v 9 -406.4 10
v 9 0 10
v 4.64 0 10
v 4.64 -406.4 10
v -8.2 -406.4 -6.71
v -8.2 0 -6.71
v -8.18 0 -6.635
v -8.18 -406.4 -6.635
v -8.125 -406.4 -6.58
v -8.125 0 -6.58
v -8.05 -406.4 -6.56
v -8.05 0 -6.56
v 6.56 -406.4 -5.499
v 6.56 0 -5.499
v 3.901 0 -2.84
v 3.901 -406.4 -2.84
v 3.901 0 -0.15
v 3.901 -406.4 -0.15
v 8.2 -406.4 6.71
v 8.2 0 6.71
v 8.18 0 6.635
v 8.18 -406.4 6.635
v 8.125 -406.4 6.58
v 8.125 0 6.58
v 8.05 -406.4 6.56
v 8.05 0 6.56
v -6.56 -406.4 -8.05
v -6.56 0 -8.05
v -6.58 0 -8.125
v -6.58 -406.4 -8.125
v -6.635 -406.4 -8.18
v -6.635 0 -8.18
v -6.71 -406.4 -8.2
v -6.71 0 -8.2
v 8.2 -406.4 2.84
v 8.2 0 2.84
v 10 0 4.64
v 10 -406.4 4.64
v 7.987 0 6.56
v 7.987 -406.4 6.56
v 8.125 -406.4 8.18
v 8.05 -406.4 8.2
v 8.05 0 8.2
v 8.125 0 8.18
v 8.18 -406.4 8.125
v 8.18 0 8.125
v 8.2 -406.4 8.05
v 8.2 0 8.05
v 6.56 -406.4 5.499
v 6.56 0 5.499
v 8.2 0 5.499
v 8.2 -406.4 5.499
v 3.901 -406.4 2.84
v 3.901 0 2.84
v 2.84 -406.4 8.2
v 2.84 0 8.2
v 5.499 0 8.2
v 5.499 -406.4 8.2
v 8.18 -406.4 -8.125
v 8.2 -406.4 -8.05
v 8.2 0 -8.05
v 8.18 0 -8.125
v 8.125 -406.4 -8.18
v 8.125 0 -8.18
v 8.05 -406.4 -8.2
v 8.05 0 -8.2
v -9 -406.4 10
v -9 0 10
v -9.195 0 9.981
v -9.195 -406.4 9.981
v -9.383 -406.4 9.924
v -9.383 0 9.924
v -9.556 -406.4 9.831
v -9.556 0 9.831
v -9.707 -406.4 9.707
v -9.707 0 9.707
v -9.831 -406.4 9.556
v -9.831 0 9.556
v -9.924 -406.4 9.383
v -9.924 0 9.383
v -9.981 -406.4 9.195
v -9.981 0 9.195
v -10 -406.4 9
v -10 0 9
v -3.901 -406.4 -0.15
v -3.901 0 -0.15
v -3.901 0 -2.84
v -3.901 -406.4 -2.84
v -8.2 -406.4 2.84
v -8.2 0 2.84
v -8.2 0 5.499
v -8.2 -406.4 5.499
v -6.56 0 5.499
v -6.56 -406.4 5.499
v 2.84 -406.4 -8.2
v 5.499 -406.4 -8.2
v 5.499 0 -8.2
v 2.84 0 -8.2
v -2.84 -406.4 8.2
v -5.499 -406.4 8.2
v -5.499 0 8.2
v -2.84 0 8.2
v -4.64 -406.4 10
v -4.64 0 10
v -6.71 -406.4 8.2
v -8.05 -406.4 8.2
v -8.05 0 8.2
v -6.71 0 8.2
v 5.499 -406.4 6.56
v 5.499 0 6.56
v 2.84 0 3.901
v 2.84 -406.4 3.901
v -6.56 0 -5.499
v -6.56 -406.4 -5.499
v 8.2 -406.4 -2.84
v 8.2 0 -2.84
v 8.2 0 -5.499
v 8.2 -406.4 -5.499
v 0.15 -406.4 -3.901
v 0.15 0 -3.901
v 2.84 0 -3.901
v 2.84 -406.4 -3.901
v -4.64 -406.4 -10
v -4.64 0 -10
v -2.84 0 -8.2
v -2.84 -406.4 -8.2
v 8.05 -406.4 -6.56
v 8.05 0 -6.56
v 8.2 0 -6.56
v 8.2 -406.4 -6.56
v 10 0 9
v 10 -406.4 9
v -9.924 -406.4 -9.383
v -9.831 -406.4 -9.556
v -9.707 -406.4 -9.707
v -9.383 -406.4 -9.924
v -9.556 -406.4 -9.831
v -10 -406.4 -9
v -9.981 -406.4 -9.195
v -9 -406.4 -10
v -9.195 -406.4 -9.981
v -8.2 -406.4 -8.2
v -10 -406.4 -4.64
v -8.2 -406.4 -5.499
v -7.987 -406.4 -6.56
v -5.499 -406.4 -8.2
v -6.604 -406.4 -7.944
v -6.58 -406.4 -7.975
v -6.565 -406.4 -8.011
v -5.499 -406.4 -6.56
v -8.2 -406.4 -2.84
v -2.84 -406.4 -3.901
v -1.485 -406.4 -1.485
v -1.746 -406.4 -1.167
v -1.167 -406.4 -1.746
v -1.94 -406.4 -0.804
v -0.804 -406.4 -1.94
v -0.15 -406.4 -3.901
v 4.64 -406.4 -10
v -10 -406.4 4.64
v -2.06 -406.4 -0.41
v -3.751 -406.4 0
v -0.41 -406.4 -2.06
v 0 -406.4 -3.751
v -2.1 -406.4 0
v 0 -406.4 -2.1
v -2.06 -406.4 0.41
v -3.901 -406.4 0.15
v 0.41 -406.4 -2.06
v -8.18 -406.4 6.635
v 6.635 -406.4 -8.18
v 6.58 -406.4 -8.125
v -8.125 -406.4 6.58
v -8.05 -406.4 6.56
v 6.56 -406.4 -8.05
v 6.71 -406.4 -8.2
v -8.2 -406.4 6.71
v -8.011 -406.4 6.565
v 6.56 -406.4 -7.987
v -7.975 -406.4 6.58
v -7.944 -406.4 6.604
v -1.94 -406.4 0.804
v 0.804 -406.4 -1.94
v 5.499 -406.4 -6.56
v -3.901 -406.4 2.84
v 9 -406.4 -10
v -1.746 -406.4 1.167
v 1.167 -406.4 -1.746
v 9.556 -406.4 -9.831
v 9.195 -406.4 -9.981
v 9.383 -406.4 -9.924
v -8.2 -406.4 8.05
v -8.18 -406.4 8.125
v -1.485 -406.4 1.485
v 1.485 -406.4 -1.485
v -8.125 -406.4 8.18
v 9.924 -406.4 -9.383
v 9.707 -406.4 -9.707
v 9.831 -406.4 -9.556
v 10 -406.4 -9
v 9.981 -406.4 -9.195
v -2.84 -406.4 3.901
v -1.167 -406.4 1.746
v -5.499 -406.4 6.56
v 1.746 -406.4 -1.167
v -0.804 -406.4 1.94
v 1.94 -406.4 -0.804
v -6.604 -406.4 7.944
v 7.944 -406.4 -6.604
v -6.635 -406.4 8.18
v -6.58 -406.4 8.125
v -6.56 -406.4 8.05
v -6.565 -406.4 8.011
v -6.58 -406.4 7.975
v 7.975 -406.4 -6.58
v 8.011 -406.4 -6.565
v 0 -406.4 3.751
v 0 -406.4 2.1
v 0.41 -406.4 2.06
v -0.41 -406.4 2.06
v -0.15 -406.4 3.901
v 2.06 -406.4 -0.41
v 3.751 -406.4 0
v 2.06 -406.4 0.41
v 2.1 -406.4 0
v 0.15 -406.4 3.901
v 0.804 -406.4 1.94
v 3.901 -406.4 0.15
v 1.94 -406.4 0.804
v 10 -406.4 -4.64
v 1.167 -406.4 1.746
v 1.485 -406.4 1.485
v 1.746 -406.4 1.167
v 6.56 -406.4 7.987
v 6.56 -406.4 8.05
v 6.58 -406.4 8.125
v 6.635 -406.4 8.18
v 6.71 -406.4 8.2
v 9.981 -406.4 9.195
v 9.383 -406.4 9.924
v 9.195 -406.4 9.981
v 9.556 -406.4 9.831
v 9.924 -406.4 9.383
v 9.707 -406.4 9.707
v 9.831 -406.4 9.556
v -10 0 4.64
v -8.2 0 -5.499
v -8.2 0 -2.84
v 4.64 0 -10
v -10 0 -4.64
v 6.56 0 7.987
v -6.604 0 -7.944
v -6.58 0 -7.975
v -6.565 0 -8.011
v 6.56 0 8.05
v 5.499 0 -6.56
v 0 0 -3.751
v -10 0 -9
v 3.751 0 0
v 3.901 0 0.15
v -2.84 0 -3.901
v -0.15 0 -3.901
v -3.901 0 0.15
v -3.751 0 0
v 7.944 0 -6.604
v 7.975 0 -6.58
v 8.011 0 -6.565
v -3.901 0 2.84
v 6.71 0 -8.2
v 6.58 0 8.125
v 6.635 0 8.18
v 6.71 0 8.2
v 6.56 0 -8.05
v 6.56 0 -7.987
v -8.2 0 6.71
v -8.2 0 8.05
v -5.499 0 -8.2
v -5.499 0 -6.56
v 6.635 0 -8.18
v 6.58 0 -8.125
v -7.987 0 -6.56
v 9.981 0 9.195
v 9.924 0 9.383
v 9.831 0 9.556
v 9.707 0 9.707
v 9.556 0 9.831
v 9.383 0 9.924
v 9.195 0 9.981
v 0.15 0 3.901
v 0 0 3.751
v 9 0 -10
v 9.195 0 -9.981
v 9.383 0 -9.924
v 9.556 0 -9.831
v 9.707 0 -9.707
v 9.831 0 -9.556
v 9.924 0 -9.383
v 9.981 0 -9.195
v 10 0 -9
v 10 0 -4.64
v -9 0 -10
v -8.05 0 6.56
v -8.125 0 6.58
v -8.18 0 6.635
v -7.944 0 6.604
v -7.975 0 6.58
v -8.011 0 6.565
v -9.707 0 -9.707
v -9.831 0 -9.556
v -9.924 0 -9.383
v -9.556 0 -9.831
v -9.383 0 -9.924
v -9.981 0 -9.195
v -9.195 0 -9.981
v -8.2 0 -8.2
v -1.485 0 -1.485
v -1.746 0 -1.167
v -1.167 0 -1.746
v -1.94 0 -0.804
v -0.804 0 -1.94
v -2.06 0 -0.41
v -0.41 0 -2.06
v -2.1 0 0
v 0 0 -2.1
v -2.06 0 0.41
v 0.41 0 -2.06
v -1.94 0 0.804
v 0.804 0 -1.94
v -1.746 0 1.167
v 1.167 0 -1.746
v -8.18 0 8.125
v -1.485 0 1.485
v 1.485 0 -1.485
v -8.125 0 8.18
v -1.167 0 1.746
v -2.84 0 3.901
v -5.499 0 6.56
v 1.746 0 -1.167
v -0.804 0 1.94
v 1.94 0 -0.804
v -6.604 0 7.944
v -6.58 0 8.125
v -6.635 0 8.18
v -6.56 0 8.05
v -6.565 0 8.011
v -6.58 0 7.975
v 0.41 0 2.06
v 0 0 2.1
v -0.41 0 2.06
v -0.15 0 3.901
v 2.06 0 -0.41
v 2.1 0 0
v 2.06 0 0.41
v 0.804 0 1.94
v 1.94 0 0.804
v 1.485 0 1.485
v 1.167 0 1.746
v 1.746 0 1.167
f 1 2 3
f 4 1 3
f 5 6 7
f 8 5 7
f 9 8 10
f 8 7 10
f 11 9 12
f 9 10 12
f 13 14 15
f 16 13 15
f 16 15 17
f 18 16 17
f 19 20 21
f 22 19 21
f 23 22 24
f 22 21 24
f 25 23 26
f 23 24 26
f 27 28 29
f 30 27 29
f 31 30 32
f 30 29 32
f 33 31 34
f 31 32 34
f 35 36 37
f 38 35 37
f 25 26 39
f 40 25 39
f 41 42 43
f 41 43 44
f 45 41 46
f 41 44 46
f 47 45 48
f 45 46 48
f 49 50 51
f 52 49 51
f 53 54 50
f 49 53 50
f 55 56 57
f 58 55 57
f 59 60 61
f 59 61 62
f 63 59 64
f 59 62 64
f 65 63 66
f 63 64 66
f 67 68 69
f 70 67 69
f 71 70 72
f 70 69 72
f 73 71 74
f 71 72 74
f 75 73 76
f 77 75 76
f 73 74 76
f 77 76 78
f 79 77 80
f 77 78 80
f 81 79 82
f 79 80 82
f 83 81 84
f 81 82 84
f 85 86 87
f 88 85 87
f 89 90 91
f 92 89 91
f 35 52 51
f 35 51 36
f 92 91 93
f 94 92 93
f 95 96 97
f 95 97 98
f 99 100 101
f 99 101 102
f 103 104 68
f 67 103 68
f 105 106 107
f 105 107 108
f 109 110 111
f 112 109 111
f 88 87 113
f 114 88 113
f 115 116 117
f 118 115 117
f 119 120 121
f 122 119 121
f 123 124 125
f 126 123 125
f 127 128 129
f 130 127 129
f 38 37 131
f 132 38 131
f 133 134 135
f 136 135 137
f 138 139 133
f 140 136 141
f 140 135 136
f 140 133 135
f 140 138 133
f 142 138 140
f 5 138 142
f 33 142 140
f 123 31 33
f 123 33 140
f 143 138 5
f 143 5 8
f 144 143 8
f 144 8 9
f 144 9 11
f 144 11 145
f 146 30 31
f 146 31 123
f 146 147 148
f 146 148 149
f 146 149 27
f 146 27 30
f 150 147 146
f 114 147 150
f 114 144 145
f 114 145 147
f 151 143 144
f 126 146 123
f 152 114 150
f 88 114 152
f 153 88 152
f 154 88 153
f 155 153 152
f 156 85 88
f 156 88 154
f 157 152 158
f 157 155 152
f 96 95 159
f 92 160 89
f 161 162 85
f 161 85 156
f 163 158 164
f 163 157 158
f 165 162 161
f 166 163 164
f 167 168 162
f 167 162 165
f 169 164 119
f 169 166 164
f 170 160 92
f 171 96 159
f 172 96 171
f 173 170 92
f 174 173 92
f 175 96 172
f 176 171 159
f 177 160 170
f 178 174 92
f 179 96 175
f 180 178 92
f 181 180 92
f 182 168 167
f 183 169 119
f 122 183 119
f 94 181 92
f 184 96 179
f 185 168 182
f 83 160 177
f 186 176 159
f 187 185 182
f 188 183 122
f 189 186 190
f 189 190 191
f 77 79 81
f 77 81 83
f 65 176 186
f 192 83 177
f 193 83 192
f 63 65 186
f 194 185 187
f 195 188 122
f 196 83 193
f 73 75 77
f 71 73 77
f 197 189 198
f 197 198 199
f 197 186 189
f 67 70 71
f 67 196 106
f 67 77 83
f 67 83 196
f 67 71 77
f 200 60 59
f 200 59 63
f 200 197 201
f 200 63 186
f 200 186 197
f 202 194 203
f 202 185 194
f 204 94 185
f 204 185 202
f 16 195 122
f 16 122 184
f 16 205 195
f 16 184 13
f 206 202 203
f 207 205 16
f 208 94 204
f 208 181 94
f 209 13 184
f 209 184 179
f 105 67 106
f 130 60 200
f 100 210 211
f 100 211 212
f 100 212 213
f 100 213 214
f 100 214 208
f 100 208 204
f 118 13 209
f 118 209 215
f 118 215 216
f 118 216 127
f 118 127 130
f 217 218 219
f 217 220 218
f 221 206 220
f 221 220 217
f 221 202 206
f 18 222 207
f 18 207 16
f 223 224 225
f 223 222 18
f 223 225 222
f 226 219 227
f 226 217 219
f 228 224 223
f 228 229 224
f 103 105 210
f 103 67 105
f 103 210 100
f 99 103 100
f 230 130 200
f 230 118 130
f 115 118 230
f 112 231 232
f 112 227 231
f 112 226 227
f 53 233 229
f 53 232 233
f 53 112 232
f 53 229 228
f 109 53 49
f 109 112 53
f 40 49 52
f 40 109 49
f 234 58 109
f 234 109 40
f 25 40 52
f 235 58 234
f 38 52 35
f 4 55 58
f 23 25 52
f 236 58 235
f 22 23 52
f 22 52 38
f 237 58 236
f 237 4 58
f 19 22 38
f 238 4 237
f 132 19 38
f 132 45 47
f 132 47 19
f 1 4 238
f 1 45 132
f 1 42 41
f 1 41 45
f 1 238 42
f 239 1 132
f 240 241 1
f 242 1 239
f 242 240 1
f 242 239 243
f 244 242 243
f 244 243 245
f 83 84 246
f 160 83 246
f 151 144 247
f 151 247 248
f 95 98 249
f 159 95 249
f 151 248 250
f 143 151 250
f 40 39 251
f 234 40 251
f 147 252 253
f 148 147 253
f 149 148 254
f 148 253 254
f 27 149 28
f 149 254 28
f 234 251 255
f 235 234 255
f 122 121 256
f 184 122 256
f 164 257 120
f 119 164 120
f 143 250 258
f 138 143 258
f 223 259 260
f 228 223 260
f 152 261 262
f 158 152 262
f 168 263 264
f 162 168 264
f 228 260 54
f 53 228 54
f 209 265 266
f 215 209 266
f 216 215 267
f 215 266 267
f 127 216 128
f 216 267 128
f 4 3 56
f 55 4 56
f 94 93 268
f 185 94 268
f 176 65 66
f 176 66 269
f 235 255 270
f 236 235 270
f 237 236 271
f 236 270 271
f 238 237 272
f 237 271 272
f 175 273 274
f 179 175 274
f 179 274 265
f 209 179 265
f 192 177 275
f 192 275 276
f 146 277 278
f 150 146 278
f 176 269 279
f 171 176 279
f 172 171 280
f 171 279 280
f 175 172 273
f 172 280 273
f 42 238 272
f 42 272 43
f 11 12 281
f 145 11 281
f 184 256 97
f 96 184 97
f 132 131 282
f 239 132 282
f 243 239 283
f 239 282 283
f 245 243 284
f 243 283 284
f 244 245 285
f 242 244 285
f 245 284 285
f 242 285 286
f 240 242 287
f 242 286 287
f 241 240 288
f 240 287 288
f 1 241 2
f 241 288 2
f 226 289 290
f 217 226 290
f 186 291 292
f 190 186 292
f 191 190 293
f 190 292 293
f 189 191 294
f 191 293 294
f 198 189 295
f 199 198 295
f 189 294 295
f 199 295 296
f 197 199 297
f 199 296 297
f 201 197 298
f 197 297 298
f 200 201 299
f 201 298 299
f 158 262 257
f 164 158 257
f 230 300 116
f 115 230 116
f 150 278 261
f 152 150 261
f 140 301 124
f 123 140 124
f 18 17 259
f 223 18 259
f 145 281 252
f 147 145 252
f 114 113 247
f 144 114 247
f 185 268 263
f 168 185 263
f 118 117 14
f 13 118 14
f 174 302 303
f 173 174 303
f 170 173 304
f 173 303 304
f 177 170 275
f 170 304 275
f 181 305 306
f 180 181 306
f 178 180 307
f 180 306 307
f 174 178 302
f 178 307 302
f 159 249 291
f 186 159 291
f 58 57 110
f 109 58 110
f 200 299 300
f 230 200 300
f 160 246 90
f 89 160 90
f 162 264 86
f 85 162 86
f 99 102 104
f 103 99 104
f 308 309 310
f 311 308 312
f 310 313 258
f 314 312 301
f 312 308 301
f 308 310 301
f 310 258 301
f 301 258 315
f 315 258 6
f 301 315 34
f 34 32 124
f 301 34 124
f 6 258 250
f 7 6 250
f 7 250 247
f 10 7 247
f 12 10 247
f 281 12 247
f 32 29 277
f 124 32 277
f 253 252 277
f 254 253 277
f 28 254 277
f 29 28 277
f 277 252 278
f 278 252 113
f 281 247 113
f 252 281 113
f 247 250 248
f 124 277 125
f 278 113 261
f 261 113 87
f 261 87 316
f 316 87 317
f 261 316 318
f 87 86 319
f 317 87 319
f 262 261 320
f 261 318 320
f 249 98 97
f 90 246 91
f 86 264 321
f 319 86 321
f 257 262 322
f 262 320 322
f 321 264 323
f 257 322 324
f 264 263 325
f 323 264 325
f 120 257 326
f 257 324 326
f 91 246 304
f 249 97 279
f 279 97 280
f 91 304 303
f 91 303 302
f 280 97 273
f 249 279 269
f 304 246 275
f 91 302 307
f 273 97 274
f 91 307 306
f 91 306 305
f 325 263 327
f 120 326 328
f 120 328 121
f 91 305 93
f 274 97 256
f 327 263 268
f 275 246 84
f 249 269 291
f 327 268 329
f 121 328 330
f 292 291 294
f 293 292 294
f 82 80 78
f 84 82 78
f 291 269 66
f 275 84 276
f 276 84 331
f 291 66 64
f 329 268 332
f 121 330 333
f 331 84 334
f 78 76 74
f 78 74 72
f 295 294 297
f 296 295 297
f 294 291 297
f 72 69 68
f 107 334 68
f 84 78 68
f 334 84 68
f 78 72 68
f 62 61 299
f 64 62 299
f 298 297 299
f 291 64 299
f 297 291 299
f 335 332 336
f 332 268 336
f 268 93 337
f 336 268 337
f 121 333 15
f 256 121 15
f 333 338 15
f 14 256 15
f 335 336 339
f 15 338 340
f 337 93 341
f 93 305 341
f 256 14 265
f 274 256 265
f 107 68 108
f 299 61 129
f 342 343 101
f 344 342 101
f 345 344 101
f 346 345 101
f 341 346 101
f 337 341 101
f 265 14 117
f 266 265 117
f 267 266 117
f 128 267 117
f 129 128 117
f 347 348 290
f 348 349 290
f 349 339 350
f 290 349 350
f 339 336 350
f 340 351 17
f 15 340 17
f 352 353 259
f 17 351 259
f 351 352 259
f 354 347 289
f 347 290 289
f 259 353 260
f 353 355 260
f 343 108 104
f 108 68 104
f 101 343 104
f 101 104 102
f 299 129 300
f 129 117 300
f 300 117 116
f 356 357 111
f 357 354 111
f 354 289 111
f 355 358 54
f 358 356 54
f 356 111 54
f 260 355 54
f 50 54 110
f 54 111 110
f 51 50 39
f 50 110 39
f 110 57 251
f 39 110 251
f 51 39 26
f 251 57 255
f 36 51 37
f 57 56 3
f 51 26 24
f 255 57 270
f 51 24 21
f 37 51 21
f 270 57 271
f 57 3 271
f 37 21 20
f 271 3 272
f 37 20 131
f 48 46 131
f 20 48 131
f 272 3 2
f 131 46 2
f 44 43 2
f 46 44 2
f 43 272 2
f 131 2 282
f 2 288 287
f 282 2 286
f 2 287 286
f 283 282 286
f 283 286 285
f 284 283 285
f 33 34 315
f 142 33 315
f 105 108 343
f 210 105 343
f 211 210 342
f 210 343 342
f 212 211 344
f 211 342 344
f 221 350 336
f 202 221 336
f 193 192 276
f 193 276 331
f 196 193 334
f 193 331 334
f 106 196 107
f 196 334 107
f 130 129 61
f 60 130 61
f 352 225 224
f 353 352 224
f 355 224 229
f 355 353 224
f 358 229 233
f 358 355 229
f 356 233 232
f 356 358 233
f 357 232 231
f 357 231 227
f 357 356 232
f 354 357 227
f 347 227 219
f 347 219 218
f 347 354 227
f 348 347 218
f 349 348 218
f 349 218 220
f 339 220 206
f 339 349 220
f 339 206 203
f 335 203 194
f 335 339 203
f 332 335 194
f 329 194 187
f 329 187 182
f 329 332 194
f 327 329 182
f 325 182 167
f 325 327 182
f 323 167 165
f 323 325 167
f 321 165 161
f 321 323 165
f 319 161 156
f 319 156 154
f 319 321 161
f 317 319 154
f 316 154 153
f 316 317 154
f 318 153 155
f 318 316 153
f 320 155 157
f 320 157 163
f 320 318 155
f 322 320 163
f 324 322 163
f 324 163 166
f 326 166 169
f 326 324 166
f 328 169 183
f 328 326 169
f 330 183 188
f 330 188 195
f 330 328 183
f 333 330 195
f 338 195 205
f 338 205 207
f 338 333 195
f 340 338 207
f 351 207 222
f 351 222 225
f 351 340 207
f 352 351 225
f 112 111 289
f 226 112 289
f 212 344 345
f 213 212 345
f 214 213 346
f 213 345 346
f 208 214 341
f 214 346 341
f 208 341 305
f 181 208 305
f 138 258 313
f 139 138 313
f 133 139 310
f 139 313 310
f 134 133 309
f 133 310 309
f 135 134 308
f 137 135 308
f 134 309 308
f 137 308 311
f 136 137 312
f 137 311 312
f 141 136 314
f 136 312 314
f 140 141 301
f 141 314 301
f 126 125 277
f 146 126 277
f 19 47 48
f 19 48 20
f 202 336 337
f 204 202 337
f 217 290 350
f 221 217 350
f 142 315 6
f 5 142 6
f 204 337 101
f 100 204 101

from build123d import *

# Parameters (mm, degrees)
F0_R     = 2.1
F1_DEPTH = 406.4


with BuildPart() as f1:
    # F0 (on Front) → F1 (new body)
    with BuildSketch(Plane.XZ):
        with BuildLine():
            Line((-4.64, 10), (-9, 10))
            ThreePointArc((-9, 10), (-9.707107, 9.707107), (-10, 9))
            Line((-10, 9), (-10, 4.64))
            Line((-10, 4.64), (-8.2, 2.84))
            Line((-8.2, 2.84), (-8.2, 5.49934))
            Line((-8.2, 5.49934), (-6.56, 5.49934))
            Line((-6.56, 5.49934), (-3.90066, 2.84))
            Line((-3.90066, 2.84), (-3.90066, 0.15))
            Line((-3.90066, 0.15), (-3.75066, 0))
            Line((-3.75066, 0), (-3.90066, -0.15))
            Line((-3.90066, -0.15), (-3.90066, -2.84))
            Line((-3.90066, -2.84), (-6.56, -5.49934))
            Line((-6.56, -5.49934), (-8.2, -5.49934))
            Line((-8.2, -5.49934), (-8.2, -2.84))
            Line((-8.2, -2.84), (-10, -4.64))
            Line((-10, -4.64), (-10, -9))
            ThreePointArc((-10, -9), (-9.707107, -9.707107), (-9, -10))
            Line((-9, -10), (-4.64, -10))
            Line((-4.64, -10), (-2.84, -8.2))
            Line((-2.84, -8.2), (-5.49934, -8.2))
            Line((-5.49934, -8.2), (-5.49934, -6.56))
            Line((-5.49934, -6.56), (-2.84, -3.90066))
            Line((-2.84, -3.90066), (-0.15, -3.90066))
            Line((-0.15, -3.90066), (0, -3.75066))
            Line((0, -3.75066), (0.15, -3.90066))
            Line((0.15, -3.90066), (2.84, -3.90066))
            Line((2.84, -3.90066), (5.49934, -6.56))
            Line((5.49934, -6.56), (5.49934, -8.2))
            Line((5.49934, -8.2), (2.84, -8.2))
            Line((2.84, -8.2), (4.64, -10))
            Line((4.64, -10), (9, -10))
            ThreePointArc((9, -10), (9.707107, -9.707107), (10, -9))
            Line((10, -9), (10, -4.64))
            Line((10, -4.64), (8.2, -2.84))
            Line((8.2, -2.84), (8.2, -5.49934))
            Line((8.2, -5.49934), (6.56, -5.49934))
            Line((6.56, -5.49934), (3.90066, -2.84))
            Line((3.90066, -2.84), (3.90066, -0.15))
            Line((3.90066, -0.15), (3.75066, 0))
            Line((3.75066, 0), (3.90066, 0.15))
            Line((3.90066, 0.15), (3.90066, 2.84))
            Line((3.90066, 2.84), (6.56, 5.49934))
            Line((6.56, 5.49934), (8.2, 5.49934))
            Line((8.2, 5.49934), (8.2, 2.84))
            Line((8.2, 2.84), (10, 4.64))
            Line((10, 4.64), (10, 9))
            ThreePointArc((10, 9), (9.707107, 9.707107), (9, 10))
            Line((9, 10), (4.64, 10))
            Line((4.64, 10), (2.84, 8.2))
            Line((2.84, 8.2), (5.49934, 8.2))
            Line((5.49934, 8.2), (5.49934, 6.56))
            Line((5.49934, 6.56), (2.84, 3.90066))
            Line((2.84, 3.90066), (0.15, 3.90066))
            Line((0.15, 3.90066), (0, 3.75066))
            Line((0, 3.75066), (-0.15, 3.90066))
            Line((-0.15, 3.90066), (-2.84, 3.90066))
            Line((-2.84, 3.90066), (-5.49934, 6.56))
            Line((-5.49934, 6.56), (-5.49934, 8.2))
            Line((-5.49934, 8.2), (-2.84, 8.2))
            Line((-2.84, 8.2), (-4.64, 10))
        make_face()
        with BuildLine():
            Line((-8.2, -8.2), (-8.2, -6.71))
            ThreePointArc((-8.2, -6.71), (-8.156066, -6.603934), (-8.05, -6.56))
            Line((-8.05, -6.56), (-7.98749, -6.56))
            Line((-7.98749, -6.56), (-6.603934, -7.943556))
            ThreePointArc((-6.603934, -7.943556), (-6.571418, -7.992219), (-6.56, -8.049622))
            Line((-6.56, -8.049622), (-6.56, -8.05))
            ThreePointArc((-6.56, -8.05), (-6.603934, -8.156066), (-6.71, -8.2))
            Line((-6.71, -8.2), (-8.2, -8.2))
        make_face(mode=Mode.SUBTRACT)
        with BuildLine():
            ThreePointArc((6.71, -8.2), (6.603934, -8.156066), (6.56, -8.05))
            Line((6.56, -8.05), (6.56, -7.98749))
            Line((6.56, -7.98749), (7.943556, -6.603934))
            ThreePointArc((7.943556, -6.603934), (7.992219, -6.571418), (8.049622, -6.56))
            Line((8.049622, -6.56), (8.2, -6.56))
            Line((8.2, -6.56), (8.2, -8.05))
            ThreePointArc((8.2, -8.05), (8.156066, -8.156066), (8.05, -8.2))
            Line((8.05, -8.2), (6.71, -8.2))
        make_face(mode=Mode.SUBTRACT)
        with BuildLine():
            ThreePointArc((-8.2, 8.05), (-8.156066, 8.156066), (-8.05, 8.2))
            Line((-8.05, 8.2), (-6.71, 8.2))
            ThreePointArc((-6.71, 8.2), (-6.603934, 8.156066), (-6.56, 8.05))
            Line((-6.56, 8.05), (-6.56, 8.049622))
            ThreePointArc((-6.56, 8.049622), (-6.571418, 7.992219), (-6.603934, 7.943556))
            Line((-6.603934, 7.943556), (-7.943556, 6.603934))
            ThreePointArc((-7.943556, 6.603934), (-7.992219, 6.571418), (-8.049622, 6.56))
            Line((-8.049622, 6.56), (-8.05, 6.56))
            ThreePointArc((-8.05, 6.56), (-8.156066, 6.603934), (-8.2, 6.71))
            Line((-8.2, 6.71), (-8.2, 8.05))
        make_face(mode=Mode.SUBTRACT)
        Circle(F0_R, mode=Mode.SUBTRACT)
        with BuildLine():
            Line((8.2, 8.05), (8.2, 6.71))
            ThreePointArc((8.2, 6.71), (8.156066, 6.603934), (8.05, 6.56))
            Line((8.05, 6.56), (7.98749, 6.56))
            Line((7.98749, 6.56), (6.56, 7.98749))
            Line((6.56, 7.98749), (6.56, 8.05))
            ThreePointArc((6.56, 8.05), (6.603934, 8.156066), (6.71, 8.2))
            Line((6.71, 8.2), (8.05, 8.2))
            ThreePointArc((8.05, 8.2), (8.156066, 8.156066), (8.2, 8.05))
        make_face(mode=Mode.SUBTRACT)
    extrude(amount=F1_DEPTH)


solid = f1.part
